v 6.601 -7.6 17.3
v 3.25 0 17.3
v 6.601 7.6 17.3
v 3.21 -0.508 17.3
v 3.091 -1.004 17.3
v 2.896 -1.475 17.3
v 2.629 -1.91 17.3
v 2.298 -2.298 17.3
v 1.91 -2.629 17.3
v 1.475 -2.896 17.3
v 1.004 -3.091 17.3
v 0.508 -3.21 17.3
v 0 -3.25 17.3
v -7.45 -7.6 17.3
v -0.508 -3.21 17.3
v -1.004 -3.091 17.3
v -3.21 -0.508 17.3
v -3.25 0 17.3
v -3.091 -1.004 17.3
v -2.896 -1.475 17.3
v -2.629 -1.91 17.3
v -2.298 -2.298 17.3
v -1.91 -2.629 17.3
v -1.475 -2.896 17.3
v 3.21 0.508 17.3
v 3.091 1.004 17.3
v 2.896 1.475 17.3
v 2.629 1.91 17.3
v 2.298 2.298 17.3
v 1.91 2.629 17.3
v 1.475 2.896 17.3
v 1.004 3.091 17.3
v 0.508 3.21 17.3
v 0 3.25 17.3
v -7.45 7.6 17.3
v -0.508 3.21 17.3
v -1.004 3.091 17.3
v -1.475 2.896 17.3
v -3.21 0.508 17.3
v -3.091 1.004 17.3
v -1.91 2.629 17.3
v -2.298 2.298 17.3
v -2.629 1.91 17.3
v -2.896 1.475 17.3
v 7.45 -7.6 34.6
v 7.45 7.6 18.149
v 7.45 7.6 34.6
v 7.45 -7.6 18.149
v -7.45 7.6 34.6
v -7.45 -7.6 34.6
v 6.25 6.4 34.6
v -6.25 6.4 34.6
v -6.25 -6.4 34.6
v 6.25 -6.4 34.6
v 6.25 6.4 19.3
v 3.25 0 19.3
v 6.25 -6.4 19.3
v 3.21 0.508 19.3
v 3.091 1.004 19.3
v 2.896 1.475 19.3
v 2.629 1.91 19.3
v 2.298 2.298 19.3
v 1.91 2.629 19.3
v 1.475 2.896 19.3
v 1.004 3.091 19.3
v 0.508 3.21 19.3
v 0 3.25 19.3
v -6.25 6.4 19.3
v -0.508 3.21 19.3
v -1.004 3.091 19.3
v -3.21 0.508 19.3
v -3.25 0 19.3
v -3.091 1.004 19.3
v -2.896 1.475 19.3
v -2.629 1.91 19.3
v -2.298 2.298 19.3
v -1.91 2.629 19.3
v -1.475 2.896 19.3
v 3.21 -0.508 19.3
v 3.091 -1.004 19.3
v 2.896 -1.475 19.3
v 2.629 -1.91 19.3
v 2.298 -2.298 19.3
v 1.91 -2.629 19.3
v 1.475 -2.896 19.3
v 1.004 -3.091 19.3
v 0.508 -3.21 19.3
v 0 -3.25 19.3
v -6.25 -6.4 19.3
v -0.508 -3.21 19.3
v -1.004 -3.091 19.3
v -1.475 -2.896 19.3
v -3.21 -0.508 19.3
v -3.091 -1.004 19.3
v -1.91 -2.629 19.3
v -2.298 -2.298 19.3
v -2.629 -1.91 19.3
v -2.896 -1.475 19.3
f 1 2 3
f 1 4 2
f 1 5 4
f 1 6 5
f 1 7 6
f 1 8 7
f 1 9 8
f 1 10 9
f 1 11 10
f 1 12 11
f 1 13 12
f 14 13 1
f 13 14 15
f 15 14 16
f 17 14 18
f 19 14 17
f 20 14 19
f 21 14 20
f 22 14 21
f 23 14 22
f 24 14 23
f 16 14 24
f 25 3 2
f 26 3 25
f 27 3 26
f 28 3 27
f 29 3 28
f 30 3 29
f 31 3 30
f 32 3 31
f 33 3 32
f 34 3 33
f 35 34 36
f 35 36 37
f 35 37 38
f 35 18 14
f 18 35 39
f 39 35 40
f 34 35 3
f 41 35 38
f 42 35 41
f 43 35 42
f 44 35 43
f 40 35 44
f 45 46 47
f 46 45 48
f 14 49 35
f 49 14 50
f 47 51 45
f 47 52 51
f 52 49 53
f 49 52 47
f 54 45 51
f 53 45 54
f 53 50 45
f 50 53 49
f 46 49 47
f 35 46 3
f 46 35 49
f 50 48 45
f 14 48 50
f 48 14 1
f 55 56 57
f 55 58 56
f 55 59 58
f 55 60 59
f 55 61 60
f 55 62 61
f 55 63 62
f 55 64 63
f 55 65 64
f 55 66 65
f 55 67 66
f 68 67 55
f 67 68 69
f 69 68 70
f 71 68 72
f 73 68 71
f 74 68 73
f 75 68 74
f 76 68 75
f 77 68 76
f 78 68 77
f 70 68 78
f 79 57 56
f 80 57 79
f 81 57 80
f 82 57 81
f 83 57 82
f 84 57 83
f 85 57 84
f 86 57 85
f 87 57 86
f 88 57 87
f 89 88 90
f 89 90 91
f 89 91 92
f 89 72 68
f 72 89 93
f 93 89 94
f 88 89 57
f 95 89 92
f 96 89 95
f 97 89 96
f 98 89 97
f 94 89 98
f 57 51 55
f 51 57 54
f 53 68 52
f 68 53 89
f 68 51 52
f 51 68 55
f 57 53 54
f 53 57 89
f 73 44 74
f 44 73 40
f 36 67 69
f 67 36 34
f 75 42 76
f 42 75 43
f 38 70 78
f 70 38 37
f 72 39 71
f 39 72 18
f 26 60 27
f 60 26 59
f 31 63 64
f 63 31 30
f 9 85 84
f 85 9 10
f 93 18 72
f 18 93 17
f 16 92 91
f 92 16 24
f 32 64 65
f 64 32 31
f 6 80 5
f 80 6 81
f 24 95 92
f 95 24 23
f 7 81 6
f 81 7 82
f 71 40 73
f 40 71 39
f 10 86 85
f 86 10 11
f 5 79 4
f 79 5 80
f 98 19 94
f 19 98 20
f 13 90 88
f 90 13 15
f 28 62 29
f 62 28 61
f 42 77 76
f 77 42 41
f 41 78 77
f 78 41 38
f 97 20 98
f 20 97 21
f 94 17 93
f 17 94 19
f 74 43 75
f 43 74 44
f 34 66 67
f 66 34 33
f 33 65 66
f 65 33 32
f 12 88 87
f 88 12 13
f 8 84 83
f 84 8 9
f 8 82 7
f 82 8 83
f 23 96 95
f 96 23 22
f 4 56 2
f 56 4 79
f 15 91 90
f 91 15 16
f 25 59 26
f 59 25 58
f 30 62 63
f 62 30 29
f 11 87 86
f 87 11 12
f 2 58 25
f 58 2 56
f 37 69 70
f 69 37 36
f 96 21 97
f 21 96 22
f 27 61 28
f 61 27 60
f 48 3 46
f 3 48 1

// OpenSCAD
include <../lib/eink-dual-lora-case-lib.scad>;
$fn = 40;
cradle_part();
